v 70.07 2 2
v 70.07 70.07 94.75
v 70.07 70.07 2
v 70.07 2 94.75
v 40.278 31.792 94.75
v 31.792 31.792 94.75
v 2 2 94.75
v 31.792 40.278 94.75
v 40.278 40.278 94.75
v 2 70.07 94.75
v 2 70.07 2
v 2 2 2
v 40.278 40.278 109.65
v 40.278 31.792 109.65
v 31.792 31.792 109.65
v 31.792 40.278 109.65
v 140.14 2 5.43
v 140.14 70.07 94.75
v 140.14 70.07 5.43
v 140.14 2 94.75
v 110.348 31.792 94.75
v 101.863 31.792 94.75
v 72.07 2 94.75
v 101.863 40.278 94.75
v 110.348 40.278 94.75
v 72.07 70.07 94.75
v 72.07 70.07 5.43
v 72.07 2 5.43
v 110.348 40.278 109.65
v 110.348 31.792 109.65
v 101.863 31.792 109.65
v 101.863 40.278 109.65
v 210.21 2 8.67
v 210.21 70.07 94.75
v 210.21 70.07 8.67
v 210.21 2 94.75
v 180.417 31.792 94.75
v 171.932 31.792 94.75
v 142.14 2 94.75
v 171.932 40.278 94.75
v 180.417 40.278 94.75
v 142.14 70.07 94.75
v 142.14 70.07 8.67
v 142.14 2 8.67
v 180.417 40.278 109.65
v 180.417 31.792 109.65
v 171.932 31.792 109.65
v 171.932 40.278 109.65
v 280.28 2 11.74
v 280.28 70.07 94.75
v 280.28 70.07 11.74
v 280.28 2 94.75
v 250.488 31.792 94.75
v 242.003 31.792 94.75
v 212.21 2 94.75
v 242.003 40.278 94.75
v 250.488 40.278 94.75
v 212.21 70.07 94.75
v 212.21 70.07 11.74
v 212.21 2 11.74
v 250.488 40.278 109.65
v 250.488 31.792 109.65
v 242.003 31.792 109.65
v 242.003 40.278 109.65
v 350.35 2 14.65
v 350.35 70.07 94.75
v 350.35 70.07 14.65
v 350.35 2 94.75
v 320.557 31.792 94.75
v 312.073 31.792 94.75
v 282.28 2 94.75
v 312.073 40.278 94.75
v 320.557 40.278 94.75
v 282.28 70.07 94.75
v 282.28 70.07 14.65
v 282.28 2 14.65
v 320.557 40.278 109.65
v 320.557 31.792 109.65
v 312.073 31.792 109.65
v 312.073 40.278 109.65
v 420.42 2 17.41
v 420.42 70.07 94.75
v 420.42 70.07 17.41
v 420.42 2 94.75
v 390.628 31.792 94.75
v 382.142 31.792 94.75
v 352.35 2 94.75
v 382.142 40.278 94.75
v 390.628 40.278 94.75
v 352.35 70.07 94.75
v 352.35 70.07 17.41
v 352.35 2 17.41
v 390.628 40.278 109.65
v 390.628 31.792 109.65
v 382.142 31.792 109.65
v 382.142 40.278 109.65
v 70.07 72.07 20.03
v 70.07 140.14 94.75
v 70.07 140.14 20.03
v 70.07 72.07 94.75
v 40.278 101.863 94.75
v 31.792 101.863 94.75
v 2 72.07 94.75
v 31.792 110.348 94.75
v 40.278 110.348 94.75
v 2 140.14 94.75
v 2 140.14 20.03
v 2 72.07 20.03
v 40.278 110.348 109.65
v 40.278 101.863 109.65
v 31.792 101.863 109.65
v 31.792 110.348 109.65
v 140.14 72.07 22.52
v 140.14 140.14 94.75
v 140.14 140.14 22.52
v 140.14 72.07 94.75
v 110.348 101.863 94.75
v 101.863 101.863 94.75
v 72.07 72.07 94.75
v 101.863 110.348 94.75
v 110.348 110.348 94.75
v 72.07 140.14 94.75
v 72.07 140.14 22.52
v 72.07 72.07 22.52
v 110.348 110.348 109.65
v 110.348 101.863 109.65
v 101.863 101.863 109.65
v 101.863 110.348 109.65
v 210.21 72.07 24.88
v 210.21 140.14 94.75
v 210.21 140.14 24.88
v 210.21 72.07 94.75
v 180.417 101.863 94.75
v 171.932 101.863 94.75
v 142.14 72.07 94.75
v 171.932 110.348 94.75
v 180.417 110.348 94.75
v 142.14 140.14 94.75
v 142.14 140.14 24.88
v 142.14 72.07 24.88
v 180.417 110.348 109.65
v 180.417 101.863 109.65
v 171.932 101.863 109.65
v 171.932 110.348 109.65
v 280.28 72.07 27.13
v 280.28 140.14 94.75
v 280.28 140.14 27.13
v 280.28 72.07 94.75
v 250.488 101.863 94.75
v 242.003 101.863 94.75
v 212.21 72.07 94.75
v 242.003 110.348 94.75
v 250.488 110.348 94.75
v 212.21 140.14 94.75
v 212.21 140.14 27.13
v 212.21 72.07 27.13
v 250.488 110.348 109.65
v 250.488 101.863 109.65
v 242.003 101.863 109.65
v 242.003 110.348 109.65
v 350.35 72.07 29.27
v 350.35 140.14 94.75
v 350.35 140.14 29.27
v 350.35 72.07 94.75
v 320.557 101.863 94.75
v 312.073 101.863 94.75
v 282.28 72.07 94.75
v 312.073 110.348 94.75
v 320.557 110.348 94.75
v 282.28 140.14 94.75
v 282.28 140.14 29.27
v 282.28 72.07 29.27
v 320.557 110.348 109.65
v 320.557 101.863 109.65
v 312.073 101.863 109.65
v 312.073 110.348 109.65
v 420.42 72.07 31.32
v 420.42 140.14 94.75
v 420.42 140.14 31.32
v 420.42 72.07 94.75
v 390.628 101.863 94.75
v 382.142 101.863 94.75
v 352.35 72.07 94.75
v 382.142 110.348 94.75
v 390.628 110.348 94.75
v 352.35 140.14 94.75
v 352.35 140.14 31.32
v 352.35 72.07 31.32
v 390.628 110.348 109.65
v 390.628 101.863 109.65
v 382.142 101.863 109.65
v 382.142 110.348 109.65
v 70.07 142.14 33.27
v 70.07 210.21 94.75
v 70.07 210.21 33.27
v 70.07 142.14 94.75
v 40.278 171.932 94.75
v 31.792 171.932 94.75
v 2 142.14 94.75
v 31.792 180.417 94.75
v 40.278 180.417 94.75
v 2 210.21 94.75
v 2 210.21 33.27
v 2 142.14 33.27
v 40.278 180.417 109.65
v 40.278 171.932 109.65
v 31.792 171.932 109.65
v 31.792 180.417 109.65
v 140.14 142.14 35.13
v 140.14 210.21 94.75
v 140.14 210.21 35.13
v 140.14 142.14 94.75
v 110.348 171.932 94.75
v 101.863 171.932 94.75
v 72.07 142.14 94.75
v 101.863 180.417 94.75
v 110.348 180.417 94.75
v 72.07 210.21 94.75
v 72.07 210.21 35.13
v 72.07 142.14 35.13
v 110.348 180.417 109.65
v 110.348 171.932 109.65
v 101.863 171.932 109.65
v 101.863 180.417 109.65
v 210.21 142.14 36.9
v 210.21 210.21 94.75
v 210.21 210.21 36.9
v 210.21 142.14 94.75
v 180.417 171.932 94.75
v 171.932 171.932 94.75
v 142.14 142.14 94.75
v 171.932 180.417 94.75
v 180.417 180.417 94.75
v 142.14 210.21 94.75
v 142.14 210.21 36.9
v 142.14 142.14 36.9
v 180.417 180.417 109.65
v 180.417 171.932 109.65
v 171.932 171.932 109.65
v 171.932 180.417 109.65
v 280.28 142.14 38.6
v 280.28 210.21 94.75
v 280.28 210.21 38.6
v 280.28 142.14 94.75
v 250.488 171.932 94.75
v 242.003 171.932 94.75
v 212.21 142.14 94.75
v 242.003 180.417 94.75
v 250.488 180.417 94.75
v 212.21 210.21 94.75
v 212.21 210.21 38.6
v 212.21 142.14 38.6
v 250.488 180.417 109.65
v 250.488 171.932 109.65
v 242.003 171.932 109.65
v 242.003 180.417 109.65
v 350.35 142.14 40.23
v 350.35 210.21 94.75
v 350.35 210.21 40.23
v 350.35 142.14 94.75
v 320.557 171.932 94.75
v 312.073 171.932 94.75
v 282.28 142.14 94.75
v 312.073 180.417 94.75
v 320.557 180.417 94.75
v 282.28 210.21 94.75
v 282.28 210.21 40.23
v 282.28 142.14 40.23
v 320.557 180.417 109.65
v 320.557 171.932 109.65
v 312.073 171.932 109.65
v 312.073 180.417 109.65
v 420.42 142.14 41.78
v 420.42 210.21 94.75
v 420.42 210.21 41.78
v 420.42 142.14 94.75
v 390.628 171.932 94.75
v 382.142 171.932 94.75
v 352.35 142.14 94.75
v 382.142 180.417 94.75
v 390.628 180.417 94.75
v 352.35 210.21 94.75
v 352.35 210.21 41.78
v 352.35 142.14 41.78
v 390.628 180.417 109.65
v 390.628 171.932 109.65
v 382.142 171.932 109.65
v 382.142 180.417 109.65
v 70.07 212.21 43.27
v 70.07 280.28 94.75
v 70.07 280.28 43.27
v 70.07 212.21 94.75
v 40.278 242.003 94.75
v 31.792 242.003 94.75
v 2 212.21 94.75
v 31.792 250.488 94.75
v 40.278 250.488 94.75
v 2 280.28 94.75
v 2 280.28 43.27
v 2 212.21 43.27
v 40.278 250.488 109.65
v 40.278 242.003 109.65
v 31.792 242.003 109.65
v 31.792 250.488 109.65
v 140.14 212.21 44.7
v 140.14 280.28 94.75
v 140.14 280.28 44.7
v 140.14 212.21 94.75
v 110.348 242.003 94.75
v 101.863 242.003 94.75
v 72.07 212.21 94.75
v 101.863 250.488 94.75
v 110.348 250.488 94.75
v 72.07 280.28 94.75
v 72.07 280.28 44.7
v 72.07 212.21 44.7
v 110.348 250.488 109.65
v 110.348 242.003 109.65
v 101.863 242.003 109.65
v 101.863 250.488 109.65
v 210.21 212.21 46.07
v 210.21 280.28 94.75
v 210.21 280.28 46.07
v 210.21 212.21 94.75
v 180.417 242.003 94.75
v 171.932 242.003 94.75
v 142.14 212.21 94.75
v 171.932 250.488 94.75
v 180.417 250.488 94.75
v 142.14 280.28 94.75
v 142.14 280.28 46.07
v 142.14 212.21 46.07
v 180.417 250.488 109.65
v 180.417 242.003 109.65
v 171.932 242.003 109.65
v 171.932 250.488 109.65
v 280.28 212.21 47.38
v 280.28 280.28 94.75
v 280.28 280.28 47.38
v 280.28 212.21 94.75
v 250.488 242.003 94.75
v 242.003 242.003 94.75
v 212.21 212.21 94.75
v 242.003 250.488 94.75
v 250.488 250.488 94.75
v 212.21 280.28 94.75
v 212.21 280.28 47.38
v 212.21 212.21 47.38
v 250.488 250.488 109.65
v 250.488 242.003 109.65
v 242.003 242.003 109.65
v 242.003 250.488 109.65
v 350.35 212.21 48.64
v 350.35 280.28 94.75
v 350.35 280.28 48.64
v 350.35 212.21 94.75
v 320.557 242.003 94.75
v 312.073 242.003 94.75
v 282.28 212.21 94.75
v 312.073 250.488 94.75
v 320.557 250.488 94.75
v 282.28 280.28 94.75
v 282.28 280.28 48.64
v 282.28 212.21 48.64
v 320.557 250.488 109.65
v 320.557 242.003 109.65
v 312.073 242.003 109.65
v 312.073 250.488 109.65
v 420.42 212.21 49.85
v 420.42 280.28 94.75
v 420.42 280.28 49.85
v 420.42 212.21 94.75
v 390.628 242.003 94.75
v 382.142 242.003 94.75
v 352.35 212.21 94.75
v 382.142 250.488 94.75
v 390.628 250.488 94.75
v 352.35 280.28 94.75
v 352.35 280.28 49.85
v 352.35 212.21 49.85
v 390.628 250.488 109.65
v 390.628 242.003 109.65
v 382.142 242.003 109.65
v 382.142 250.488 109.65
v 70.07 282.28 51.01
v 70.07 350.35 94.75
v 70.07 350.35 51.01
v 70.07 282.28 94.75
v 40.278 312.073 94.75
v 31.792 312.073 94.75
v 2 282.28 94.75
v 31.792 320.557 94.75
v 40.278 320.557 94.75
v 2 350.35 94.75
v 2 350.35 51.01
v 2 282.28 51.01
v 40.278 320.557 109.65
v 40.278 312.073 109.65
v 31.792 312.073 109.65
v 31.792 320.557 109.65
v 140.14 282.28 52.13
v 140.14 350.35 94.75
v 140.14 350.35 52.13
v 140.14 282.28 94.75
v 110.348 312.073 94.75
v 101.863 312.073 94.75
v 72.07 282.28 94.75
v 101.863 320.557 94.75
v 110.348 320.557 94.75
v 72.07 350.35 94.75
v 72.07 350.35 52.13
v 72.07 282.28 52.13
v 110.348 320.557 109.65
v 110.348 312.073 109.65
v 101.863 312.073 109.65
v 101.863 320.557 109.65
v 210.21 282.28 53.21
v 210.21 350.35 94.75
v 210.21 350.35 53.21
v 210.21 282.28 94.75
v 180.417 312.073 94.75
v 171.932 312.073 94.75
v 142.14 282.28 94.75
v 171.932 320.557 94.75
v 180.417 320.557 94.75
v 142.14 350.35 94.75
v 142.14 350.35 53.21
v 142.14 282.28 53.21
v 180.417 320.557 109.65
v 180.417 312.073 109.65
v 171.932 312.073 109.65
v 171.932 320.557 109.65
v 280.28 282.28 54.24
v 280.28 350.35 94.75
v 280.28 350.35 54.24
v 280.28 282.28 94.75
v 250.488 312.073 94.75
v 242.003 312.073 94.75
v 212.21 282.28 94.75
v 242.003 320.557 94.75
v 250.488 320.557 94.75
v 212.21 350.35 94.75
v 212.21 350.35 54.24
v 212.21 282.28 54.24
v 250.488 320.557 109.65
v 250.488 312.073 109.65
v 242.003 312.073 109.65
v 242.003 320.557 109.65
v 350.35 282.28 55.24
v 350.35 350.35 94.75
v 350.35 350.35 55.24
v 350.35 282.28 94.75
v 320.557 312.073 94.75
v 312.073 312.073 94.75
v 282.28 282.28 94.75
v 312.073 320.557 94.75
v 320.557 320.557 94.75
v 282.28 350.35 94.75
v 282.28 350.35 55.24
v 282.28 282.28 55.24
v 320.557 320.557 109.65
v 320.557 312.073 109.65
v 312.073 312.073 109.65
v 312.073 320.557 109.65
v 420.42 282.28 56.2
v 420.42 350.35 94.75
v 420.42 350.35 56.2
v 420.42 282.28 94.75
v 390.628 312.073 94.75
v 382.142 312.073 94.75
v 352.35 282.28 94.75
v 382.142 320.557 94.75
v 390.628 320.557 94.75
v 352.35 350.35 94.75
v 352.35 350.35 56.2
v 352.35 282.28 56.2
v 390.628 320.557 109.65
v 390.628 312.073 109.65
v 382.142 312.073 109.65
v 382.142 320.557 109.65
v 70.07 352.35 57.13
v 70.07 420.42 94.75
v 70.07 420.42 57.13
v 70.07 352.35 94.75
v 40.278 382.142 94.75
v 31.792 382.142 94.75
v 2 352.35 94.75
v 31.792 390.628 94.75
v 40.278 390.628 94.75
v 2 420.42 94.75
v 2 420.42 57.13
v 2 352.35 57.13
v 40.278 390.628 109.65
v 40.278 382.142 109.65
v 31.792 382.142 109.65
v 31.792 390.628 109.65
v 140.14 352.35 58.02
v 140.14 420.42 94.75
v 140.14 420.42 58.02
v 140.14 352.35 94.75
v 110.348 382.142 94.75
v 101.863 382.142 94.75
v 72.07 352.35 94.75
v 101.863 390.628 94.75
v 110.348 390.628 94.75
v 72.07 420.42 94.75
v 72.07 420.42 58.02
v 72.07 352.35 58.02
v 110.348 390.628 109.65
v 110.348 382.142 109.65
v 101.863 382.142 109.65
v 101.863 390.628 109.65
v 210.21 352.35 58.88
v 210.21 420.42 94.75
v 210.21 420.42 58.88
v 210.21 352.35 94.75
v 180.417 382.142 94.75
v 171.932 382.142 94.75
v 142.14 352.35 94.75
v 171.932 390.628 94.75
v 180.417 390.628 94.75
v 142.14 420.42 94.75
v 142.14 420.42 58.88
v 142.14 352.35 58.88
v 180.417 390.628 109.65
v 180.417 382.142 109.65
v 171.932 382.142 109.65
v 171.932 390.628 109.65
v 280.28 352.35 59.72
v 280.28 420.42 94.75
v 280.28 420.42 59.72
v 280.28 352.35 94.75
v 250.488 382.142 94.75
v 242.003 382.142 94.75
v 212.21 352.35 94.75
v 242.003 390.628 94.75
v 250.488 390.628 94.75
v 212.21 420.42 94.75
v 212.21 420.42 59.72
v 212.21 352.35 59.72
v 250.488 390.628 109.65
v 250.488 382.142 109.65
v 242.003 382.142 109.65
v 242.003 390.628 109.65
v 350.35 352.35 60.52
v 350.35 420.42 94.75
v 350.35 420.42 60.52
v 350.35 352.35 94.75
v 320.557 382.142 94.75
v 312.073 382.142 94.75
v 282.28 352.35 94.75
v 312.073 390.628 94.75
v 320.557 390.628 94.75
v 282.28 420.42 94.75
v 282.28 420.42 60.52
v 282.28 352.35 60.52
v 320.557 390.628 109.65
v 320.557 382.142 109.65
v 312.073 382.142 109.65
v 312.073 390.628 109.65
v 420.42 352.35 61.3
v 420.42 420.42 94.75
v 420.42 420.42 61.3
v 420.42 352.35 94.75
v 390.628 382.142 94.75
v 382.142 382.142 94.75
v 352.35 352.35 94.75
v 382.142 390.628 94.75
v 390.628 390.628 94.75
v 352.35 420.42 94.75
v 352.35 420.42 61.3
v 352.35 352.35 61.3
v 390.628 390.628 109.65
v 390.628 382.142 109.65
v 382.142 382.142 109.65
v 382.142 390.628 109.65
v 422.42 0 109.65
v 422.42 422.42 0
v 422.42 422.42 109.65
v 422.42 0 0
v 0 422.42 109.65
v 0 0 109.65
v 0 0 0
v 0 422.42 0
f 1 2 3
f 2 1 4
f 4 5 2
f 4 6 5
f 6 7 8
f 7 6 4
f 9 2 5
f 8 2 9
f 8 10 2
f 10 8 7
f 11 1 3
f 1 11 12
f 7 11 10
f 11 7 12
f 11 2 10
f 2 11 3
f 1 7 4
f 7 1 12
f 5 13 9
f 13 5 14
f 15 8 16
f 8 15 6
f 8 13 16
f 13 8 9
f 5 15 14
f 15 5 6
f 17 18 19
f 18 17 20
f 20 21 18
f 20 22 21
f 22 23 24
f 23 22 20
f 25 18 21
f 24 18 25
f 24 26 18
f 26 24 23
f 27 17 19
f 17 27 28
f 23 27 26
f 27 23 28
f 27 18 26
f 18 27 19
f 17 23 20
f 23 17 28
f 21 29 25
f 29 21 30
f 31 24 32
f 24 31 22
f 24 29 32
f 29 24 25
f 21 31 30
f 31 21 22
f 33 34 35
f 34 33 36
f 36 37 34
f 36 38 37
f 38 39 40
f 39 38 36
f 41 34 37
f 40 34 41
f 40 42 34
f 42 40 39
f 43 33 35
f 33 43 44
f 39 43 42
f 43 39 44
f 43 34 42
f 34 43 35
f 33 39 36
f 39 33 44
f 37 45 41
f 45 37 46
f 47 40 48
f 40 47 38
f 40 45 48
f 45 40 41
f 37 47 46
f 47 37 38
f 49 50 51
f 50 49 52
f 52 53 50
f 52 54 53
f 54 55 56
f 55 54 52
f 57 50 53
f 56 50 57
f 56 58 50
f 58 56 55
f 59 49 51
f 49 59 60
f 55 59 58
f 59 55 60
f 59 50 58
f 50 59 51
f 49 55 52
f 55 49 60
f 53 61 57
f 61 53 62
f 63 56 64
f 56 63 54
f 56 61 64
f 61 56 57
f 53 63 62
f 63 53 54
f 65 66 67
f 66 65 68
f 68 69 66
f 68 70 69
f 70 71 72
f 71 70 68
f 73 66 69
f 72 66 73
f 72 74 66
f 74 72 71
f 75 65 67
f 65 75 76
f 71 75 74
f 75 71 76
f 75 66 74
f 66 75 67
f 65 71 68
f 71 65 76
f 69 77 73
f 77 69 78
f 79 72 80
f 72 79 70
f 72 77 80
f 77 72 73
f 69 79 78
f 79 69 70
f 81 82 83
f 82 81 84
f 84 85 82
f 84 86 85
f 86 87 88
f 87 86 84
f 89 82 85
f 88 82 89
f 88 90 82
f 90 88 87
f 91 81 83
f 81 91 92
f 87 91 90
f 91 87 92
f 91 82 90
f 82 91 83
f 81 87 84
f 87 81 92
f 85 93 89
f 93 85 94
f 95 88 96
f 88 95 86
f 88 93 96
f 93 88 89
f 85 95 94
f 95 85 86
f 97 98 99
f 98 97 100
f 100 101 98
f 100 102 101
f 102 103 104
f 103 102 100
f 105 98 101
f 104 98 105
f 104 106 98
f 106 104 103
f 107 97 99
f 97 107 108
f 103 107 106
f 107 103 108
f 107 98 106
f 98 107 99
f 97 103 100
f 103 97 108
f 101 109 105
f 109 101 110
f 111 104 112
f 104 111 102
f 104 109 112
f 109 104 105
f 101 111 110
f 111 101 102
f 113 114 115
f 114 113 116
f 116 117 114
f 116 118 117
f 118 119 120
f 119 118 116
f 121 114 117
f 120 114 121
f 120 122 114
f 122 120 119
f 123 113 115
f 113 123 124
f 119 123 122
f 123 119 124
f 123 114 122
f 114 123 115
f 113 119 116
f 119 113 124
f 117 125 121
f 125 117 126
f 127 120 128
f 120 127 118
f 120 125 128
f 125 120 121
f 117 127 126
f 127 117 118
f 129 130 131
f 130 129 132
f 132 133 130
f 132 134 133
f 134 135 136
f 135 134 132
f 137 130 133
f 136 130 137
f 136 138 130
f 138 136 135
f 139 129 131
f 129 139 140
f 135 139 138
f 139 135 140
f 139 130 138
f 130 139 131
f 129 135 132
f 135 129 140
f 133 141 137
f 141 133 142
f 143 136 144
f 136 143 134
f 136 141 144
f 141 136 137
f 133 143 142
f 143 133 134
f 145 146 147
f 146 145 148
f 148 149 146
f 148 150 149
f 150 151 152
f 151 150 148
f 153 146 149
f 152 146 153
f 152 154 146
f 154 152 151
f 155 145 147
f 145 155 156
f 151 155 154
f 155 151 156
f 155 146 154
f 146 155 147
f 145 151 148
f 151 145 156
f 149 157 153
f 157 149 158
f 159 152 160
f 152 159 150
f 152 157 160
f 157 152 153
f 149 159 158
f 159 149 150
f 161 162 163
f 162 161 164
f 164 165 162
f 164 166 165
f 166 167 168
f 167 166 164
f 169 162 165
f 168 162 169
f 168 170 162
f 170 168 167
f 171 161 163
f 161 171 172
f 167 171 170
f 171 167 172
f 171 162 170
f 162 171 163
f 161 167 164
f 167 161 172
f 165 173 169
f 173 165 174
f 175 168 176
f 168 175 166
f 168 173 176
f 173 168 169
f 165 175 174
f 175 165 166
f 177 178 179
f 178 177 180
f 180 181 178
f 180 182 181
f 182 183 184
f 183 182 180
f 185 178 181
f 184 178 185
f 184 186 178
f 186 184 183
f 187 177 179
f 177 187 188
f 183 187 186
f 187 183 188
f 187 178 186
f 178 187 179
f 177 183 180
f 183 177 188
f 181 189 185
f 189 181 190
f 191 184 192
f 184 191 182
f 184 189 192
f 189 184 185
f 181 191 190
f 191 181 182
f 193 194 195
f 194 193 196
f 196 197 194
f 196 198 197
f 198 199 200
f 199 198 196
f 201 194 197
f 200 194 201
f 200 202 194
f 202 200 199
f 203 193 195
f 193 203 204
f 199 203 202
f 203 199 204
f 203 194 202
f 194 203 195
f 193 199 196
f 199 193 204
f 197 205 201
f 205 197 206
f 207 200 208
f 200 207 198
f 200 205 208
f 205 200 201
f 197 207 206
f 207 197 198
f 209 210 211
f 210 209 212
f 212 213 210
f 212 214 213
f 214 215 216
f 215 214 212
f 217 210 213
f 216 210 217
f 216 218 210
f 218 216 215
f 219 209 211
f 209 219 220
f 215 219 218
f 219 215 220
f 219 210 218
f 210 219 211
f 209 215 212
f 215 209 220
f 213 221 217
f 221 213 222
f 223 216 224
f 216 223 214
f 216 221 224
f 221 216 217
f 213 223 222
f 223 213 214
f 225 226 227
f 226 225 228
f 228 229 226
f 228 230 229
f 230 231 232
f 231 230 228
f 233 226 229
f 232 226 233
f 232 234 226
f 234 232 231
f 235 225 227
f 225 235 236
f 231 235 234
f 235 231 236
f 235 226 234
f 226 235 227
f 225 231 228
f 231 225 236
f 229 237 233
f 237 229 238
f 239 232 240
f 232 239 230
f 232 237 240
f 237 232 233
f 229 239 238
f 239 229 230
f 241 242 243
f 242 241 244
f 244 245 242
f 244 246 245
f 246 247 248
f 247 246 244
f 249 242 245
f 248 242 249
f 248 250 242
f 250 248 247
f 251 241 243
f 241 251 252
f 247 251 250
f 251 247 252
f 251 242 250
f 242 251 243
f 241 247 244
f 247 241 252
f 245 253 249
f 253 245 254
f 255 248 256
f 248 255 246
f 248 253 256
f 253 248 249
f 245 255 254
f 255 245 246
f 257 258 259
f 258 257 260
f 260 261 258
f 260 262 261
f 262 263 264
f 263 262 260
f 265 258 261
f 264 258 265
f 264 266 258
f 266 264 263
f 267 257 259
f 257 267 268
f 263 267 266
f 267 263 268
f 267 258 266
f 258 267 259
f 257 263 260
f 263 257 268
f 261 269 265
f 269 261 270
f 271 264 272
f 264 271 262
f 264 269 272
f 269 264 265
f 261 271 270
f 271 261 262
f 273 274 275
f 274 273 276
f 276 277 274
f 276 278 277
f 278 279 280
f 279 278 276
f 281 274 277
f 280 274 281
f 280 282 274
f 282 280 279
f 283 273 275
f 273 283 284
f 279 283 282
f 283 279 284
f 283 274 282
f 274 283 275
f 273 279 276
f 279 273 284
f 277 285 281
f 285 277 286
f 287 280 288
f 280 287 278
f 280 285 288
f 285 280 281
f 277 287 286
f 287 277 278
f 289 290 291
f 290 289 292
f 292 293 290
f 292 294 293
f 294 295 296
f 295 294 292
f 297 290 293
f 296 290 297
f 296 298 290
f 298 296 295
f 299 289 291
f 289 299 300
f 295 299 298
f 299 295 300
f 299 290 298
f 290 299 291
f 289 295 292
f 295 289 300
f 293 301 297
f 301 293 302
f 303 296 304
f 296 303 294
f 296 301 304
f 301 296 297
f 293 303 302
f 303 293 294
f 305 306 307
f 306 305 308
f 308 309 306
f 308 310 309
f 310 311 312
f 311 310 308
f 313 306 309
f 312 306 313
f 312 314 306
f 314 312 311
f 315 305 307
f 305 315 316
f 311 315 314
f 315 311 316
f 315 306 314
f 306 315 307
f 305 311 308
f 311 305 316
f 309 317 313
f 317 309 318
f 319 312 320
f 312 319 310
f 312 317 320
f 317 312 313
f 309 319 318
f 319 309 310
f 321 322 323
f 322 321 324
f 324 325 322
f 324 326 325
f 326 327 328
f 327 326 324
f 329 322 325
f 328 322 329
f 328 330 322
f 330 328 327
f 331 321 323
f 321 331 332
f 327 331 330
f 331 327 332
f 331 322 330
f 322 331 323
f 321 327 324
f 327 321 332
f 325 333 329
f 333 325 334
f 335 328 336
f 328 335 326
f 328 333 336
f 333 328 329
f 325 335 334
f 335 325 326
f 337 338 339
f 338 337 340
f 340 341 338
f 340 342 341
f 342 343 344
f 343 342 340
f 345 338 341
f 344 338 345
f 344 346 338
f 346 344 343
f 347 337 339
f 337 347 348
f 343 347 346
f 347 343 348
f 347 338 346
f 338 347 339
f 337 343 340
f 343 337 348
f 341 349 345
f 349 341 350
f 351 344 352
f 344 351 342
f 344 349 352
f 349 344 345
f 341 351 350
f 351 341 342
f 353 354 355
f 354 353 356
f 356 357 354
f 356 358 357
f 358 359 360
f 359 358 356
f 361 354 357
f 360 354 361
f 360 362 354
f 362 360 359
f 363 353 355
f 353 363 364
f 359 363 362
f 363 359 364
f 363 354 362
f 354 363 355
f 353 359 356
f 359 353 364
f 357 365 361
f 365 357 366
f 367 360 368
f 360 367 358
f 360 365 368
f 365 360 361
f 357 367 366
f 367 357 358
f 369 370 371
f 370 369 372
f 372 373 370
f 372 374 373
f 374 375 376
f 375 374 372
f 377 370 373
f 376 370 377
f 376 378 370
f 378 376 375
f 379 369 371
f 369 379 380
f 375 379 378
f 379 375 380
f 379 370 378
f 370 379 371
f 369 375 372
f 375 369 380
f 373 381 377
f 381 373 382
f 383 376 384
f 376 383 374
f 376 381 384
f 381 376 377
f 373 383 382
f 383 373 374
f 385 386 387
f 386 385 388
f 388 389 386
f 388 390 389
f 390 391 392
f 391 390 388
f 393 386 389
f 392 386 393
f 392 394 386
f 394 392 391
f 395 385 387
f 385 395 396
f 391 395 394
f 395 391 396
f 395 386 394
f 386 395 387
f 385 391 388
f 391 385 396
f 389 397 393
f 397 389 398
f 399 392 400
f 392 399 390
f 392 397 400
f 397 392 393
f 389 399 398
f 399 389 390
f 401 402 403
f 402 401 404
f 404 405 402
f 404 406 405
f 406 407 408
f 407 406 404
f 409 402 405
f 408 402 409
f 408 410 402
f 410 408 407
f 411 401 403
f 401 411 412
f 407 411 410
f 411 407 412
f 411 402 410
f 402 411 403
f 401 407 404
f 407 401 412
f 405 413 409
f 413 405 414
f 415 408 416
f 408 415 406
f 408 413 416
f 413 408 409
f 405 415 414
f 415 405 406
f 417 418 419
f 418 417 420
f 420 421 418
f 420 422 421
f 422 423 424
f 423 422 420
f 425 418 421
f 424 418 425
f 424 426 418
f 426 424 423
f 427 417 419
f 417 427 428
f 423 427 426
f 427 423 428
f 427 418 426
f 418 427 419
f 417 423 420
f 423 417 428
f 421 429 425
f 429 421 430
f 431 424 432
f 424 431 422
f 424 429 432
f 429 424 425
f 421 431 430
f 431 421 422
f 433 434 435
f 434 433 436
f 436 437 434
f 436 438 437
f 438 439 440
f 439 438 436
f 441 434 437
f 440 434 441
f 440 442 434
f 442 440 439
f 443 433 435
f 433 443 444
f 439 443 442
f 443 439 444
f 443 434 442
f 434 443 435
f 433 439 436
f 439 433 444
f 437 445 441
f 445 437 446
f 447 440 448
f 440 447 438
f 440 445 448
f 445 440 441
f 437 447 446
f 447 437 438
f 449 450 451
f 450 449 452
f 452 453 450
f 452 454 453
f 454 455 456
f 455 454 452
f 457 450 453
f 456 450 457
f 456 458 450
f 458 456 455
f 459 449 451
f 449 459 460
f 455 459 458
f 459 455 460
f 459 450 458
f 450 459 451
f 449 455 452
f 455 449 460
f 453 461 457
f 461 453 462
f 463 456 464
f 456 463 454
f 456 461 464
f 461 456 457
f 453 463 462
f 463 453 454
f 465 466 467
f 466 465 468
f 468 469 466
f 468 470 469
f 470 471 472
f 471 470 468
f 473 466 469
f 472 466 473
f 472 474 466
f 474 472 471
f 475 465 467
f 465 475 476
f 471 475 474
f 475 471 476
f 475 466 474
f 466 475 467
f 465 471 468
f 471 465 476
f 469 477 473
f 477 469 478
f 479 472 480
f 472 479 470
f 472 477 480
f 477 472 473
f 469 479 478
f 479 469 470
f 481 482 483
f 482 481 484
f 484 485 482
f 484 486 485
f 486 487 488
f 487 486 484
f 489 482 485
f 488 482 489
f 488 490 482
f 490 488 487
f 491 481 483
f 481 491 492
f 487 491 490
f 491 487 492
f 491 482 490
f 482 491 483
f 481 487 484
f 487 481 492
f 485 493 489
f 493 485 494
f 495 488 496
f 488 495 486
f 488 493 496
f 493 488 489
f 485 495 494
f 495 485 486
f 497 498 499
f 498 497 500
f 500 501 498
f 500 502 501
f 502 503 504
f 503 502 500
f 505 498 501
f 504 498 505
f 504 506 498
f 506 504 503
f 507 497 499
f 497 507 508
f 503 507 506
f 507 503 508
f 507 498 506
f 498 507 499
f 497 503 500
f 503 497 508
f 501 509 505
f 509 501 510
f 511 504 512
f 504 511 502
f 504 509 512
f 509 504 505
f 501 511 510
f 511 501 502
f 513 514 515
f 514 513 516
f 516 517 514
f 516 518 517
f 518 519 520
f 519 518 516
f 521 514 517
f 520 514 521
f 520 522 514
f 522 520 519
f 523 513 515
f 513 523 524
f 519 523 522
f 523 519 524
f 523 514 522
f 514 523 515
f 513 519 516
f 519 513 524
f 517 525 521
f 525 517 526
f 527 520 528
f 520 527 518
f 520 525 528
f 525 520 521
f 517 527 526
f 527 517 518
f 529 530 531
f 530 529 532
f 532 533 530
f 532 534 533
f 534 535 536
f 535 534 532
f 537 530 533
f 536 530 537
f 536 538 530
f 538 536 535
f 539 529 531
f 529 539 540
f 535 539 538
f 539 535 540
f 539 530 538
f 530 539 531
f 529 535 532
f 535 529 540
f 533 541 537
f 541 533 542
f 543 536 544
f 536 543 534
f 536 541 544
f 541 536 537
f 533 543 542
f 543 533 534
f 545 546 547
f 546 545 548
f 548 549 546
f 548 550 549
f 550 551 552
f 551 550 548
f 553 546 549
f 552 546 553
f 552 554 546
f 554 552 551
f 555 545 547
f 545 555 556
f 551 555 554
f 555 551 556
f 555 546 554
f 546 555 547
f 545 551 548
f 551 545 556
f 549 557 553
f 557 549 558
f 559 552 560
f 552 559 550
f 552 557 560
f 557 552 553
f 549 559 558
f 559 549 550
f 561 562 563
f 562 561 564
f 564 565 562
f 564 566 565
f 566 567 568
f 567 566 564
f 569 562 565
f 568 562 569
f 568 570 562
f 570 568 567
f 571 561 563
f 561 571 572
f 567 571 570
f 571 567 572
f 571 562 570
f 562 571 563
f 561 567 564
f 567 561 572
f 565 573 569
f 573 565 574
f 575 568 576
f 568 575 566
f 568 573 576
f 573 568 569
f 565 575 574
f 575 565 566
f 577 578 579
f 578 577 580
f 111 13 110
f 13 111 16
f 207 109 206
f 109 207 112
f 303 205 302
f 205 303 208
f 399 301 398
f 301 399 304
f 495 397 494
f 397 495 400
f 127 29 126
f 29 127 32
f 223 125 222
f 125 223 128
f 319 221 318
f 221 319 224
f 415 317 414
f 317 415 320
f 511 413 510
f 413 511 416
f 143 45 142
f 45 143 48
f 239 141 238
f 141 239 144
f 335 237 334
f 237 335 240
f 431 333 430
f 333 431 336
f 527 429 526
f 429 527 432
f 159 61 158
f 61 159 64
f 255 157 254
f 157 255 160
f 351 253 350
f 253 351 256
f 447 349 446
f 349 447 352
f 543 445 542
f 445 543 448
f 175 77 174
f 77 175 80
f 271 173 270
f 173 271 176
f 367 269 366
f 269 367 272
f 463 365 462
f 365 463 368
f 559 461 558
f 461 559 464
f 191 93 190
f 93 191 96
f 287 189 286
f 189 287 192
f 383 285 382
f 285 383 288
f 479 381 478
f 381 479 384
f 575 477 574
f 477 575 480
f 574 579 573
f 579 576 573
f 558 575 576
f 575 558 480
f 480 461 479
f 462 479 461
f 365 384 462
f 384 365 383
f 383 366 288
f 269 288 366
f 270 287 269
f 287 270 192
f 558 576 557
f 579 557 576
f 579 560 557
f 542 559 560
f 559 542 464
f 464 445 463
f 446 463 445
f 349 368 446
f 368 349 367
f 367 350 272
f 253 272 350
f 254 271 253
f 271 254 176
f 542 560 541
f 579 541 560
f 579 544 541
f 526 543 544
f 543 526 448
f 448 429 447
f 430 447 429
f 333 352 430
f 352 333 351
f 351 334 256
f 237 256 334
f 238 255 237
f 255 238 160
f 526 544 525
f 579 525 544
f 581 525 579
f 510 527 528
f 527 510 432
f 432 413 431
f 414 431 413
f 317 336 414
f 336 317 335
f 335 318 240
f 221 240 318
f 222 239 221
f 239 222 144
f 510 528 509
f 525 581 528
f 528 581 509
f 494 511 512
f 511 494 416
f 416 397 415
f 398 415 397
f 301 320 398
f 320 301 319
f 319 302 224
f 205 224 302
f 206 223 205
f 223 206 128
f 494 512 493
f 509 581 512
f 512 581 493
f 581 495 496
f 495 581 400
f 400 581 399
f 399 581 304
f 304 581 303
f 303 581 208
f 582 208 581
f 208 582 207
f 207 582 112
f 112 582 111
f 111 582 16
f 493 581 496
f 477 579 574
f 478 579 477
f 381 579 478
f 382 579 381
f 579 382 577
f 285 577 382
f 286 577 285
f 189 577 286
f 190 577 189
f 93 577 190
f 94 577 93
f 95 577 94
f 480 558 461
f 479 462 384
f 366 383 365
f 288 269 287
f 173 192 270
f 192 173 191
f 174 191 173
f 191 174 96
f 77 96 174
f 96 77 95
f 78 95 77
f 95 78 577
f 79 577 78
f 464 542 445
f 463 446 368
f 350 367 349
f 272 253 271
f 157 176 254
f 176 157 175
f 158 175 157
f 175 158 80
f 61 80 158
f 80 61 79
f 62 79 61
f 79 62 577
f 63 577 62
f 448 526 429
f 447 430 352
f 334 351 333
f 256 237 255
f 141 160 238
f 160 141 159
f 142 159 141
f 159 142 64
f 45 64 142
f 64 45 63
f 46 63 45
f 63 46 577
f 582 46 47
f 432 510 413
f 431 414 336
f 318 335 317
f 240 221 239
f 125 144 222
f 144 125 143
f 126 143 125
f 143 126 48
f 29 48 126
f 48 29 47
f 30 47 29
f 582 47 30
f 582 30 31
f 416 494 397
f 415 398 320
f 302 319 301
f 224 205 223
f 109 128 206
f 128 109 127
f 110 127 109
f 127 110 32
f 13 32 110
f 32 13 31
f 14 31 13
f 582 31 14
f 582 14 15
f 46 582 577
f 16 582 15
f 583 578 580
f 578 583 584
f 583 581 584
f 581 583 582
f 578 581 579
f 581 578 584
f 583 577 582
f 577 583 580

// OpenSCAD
// --- PARÁMETROS GENERALES ---
s_celda = 68.07;      
g = 2;                
d_cuello = 8.485;     
L_cuello = 15;        
h_max = 92.65;        

tam_x = 6 * s_celda + 7 * g; 
tam_y = tam_x; 
tam_z = g + h_max + L_cuello; 

h_cav = [
    92.65, 89.22, 85.98, 82.91, 80.00, 77.24, 
    74.62, 72.13, 69.77, 67.52, 65.38, 63.33, 
    61.38, 59.52, 57.75, 56.05, 54.42, 52.87, 
    51.38, 49.95, 48.58, 47.27, 46.01, 44.80, 
    43.64, 42.52, 41.44, 40.41, 39.41, 38.45, 
    37.52, 36.63, 35.77, 34.93, 34.13, 33.35
];

// --- GENERACIÓN CON CORTE TRANSVERSAL Y COLORES ---
difference() {
    
    // 1. EL PANEL COMPLETO
    difference() {
        // Bloque principal de plástico  
        cube([tam_x, tam_y, tam_z]); 
        
        for (i = [0 : 5]) {        
            for (j = [0 : 5]) {    
                idx = i * 6 + j;
                pos_x = g + j * (s_celda + g);
                pos_y = g + i * (s_celda + g);
                
                // Z de inicio de la cavidad
                pos_z_cavidad = tam_z - L_cuello - h_cav[idx];
                
                // A) Restar la cavidad de aire (Color ROJO para el interior)
                color("pink")
                translate([pos_x, pos_y, pos_z_cavidad])
                    cube([s_celda, s_celda, h_cav[idx] + 0.1]); 
                    
                // B) Restar el cuello (Color AZUL para distinguirlo)
                centro_x = pos_x + (s_celda / 2) - (d_cuello / 2);
                centro_y = pos_y + (s_celda / 2) - (d_cuello / 2);
                
                color("cyan")
                translate([centro_x, centro_y, tam_z - L_cuello - 0.1])
                    cube([d_cuello, d_cuello, L_cuello + 0.2]); 
            }
        }
    }
    
    // 2. HERRAMIENTA DE CORTE 
    /*
    y_corte = g + 2*(s_celda+g) + s_celda/2; 
    translate([-10, y_corte, -10])
        cube([tam_x + 20, tam_y, tam_z + 20]);*/
}
